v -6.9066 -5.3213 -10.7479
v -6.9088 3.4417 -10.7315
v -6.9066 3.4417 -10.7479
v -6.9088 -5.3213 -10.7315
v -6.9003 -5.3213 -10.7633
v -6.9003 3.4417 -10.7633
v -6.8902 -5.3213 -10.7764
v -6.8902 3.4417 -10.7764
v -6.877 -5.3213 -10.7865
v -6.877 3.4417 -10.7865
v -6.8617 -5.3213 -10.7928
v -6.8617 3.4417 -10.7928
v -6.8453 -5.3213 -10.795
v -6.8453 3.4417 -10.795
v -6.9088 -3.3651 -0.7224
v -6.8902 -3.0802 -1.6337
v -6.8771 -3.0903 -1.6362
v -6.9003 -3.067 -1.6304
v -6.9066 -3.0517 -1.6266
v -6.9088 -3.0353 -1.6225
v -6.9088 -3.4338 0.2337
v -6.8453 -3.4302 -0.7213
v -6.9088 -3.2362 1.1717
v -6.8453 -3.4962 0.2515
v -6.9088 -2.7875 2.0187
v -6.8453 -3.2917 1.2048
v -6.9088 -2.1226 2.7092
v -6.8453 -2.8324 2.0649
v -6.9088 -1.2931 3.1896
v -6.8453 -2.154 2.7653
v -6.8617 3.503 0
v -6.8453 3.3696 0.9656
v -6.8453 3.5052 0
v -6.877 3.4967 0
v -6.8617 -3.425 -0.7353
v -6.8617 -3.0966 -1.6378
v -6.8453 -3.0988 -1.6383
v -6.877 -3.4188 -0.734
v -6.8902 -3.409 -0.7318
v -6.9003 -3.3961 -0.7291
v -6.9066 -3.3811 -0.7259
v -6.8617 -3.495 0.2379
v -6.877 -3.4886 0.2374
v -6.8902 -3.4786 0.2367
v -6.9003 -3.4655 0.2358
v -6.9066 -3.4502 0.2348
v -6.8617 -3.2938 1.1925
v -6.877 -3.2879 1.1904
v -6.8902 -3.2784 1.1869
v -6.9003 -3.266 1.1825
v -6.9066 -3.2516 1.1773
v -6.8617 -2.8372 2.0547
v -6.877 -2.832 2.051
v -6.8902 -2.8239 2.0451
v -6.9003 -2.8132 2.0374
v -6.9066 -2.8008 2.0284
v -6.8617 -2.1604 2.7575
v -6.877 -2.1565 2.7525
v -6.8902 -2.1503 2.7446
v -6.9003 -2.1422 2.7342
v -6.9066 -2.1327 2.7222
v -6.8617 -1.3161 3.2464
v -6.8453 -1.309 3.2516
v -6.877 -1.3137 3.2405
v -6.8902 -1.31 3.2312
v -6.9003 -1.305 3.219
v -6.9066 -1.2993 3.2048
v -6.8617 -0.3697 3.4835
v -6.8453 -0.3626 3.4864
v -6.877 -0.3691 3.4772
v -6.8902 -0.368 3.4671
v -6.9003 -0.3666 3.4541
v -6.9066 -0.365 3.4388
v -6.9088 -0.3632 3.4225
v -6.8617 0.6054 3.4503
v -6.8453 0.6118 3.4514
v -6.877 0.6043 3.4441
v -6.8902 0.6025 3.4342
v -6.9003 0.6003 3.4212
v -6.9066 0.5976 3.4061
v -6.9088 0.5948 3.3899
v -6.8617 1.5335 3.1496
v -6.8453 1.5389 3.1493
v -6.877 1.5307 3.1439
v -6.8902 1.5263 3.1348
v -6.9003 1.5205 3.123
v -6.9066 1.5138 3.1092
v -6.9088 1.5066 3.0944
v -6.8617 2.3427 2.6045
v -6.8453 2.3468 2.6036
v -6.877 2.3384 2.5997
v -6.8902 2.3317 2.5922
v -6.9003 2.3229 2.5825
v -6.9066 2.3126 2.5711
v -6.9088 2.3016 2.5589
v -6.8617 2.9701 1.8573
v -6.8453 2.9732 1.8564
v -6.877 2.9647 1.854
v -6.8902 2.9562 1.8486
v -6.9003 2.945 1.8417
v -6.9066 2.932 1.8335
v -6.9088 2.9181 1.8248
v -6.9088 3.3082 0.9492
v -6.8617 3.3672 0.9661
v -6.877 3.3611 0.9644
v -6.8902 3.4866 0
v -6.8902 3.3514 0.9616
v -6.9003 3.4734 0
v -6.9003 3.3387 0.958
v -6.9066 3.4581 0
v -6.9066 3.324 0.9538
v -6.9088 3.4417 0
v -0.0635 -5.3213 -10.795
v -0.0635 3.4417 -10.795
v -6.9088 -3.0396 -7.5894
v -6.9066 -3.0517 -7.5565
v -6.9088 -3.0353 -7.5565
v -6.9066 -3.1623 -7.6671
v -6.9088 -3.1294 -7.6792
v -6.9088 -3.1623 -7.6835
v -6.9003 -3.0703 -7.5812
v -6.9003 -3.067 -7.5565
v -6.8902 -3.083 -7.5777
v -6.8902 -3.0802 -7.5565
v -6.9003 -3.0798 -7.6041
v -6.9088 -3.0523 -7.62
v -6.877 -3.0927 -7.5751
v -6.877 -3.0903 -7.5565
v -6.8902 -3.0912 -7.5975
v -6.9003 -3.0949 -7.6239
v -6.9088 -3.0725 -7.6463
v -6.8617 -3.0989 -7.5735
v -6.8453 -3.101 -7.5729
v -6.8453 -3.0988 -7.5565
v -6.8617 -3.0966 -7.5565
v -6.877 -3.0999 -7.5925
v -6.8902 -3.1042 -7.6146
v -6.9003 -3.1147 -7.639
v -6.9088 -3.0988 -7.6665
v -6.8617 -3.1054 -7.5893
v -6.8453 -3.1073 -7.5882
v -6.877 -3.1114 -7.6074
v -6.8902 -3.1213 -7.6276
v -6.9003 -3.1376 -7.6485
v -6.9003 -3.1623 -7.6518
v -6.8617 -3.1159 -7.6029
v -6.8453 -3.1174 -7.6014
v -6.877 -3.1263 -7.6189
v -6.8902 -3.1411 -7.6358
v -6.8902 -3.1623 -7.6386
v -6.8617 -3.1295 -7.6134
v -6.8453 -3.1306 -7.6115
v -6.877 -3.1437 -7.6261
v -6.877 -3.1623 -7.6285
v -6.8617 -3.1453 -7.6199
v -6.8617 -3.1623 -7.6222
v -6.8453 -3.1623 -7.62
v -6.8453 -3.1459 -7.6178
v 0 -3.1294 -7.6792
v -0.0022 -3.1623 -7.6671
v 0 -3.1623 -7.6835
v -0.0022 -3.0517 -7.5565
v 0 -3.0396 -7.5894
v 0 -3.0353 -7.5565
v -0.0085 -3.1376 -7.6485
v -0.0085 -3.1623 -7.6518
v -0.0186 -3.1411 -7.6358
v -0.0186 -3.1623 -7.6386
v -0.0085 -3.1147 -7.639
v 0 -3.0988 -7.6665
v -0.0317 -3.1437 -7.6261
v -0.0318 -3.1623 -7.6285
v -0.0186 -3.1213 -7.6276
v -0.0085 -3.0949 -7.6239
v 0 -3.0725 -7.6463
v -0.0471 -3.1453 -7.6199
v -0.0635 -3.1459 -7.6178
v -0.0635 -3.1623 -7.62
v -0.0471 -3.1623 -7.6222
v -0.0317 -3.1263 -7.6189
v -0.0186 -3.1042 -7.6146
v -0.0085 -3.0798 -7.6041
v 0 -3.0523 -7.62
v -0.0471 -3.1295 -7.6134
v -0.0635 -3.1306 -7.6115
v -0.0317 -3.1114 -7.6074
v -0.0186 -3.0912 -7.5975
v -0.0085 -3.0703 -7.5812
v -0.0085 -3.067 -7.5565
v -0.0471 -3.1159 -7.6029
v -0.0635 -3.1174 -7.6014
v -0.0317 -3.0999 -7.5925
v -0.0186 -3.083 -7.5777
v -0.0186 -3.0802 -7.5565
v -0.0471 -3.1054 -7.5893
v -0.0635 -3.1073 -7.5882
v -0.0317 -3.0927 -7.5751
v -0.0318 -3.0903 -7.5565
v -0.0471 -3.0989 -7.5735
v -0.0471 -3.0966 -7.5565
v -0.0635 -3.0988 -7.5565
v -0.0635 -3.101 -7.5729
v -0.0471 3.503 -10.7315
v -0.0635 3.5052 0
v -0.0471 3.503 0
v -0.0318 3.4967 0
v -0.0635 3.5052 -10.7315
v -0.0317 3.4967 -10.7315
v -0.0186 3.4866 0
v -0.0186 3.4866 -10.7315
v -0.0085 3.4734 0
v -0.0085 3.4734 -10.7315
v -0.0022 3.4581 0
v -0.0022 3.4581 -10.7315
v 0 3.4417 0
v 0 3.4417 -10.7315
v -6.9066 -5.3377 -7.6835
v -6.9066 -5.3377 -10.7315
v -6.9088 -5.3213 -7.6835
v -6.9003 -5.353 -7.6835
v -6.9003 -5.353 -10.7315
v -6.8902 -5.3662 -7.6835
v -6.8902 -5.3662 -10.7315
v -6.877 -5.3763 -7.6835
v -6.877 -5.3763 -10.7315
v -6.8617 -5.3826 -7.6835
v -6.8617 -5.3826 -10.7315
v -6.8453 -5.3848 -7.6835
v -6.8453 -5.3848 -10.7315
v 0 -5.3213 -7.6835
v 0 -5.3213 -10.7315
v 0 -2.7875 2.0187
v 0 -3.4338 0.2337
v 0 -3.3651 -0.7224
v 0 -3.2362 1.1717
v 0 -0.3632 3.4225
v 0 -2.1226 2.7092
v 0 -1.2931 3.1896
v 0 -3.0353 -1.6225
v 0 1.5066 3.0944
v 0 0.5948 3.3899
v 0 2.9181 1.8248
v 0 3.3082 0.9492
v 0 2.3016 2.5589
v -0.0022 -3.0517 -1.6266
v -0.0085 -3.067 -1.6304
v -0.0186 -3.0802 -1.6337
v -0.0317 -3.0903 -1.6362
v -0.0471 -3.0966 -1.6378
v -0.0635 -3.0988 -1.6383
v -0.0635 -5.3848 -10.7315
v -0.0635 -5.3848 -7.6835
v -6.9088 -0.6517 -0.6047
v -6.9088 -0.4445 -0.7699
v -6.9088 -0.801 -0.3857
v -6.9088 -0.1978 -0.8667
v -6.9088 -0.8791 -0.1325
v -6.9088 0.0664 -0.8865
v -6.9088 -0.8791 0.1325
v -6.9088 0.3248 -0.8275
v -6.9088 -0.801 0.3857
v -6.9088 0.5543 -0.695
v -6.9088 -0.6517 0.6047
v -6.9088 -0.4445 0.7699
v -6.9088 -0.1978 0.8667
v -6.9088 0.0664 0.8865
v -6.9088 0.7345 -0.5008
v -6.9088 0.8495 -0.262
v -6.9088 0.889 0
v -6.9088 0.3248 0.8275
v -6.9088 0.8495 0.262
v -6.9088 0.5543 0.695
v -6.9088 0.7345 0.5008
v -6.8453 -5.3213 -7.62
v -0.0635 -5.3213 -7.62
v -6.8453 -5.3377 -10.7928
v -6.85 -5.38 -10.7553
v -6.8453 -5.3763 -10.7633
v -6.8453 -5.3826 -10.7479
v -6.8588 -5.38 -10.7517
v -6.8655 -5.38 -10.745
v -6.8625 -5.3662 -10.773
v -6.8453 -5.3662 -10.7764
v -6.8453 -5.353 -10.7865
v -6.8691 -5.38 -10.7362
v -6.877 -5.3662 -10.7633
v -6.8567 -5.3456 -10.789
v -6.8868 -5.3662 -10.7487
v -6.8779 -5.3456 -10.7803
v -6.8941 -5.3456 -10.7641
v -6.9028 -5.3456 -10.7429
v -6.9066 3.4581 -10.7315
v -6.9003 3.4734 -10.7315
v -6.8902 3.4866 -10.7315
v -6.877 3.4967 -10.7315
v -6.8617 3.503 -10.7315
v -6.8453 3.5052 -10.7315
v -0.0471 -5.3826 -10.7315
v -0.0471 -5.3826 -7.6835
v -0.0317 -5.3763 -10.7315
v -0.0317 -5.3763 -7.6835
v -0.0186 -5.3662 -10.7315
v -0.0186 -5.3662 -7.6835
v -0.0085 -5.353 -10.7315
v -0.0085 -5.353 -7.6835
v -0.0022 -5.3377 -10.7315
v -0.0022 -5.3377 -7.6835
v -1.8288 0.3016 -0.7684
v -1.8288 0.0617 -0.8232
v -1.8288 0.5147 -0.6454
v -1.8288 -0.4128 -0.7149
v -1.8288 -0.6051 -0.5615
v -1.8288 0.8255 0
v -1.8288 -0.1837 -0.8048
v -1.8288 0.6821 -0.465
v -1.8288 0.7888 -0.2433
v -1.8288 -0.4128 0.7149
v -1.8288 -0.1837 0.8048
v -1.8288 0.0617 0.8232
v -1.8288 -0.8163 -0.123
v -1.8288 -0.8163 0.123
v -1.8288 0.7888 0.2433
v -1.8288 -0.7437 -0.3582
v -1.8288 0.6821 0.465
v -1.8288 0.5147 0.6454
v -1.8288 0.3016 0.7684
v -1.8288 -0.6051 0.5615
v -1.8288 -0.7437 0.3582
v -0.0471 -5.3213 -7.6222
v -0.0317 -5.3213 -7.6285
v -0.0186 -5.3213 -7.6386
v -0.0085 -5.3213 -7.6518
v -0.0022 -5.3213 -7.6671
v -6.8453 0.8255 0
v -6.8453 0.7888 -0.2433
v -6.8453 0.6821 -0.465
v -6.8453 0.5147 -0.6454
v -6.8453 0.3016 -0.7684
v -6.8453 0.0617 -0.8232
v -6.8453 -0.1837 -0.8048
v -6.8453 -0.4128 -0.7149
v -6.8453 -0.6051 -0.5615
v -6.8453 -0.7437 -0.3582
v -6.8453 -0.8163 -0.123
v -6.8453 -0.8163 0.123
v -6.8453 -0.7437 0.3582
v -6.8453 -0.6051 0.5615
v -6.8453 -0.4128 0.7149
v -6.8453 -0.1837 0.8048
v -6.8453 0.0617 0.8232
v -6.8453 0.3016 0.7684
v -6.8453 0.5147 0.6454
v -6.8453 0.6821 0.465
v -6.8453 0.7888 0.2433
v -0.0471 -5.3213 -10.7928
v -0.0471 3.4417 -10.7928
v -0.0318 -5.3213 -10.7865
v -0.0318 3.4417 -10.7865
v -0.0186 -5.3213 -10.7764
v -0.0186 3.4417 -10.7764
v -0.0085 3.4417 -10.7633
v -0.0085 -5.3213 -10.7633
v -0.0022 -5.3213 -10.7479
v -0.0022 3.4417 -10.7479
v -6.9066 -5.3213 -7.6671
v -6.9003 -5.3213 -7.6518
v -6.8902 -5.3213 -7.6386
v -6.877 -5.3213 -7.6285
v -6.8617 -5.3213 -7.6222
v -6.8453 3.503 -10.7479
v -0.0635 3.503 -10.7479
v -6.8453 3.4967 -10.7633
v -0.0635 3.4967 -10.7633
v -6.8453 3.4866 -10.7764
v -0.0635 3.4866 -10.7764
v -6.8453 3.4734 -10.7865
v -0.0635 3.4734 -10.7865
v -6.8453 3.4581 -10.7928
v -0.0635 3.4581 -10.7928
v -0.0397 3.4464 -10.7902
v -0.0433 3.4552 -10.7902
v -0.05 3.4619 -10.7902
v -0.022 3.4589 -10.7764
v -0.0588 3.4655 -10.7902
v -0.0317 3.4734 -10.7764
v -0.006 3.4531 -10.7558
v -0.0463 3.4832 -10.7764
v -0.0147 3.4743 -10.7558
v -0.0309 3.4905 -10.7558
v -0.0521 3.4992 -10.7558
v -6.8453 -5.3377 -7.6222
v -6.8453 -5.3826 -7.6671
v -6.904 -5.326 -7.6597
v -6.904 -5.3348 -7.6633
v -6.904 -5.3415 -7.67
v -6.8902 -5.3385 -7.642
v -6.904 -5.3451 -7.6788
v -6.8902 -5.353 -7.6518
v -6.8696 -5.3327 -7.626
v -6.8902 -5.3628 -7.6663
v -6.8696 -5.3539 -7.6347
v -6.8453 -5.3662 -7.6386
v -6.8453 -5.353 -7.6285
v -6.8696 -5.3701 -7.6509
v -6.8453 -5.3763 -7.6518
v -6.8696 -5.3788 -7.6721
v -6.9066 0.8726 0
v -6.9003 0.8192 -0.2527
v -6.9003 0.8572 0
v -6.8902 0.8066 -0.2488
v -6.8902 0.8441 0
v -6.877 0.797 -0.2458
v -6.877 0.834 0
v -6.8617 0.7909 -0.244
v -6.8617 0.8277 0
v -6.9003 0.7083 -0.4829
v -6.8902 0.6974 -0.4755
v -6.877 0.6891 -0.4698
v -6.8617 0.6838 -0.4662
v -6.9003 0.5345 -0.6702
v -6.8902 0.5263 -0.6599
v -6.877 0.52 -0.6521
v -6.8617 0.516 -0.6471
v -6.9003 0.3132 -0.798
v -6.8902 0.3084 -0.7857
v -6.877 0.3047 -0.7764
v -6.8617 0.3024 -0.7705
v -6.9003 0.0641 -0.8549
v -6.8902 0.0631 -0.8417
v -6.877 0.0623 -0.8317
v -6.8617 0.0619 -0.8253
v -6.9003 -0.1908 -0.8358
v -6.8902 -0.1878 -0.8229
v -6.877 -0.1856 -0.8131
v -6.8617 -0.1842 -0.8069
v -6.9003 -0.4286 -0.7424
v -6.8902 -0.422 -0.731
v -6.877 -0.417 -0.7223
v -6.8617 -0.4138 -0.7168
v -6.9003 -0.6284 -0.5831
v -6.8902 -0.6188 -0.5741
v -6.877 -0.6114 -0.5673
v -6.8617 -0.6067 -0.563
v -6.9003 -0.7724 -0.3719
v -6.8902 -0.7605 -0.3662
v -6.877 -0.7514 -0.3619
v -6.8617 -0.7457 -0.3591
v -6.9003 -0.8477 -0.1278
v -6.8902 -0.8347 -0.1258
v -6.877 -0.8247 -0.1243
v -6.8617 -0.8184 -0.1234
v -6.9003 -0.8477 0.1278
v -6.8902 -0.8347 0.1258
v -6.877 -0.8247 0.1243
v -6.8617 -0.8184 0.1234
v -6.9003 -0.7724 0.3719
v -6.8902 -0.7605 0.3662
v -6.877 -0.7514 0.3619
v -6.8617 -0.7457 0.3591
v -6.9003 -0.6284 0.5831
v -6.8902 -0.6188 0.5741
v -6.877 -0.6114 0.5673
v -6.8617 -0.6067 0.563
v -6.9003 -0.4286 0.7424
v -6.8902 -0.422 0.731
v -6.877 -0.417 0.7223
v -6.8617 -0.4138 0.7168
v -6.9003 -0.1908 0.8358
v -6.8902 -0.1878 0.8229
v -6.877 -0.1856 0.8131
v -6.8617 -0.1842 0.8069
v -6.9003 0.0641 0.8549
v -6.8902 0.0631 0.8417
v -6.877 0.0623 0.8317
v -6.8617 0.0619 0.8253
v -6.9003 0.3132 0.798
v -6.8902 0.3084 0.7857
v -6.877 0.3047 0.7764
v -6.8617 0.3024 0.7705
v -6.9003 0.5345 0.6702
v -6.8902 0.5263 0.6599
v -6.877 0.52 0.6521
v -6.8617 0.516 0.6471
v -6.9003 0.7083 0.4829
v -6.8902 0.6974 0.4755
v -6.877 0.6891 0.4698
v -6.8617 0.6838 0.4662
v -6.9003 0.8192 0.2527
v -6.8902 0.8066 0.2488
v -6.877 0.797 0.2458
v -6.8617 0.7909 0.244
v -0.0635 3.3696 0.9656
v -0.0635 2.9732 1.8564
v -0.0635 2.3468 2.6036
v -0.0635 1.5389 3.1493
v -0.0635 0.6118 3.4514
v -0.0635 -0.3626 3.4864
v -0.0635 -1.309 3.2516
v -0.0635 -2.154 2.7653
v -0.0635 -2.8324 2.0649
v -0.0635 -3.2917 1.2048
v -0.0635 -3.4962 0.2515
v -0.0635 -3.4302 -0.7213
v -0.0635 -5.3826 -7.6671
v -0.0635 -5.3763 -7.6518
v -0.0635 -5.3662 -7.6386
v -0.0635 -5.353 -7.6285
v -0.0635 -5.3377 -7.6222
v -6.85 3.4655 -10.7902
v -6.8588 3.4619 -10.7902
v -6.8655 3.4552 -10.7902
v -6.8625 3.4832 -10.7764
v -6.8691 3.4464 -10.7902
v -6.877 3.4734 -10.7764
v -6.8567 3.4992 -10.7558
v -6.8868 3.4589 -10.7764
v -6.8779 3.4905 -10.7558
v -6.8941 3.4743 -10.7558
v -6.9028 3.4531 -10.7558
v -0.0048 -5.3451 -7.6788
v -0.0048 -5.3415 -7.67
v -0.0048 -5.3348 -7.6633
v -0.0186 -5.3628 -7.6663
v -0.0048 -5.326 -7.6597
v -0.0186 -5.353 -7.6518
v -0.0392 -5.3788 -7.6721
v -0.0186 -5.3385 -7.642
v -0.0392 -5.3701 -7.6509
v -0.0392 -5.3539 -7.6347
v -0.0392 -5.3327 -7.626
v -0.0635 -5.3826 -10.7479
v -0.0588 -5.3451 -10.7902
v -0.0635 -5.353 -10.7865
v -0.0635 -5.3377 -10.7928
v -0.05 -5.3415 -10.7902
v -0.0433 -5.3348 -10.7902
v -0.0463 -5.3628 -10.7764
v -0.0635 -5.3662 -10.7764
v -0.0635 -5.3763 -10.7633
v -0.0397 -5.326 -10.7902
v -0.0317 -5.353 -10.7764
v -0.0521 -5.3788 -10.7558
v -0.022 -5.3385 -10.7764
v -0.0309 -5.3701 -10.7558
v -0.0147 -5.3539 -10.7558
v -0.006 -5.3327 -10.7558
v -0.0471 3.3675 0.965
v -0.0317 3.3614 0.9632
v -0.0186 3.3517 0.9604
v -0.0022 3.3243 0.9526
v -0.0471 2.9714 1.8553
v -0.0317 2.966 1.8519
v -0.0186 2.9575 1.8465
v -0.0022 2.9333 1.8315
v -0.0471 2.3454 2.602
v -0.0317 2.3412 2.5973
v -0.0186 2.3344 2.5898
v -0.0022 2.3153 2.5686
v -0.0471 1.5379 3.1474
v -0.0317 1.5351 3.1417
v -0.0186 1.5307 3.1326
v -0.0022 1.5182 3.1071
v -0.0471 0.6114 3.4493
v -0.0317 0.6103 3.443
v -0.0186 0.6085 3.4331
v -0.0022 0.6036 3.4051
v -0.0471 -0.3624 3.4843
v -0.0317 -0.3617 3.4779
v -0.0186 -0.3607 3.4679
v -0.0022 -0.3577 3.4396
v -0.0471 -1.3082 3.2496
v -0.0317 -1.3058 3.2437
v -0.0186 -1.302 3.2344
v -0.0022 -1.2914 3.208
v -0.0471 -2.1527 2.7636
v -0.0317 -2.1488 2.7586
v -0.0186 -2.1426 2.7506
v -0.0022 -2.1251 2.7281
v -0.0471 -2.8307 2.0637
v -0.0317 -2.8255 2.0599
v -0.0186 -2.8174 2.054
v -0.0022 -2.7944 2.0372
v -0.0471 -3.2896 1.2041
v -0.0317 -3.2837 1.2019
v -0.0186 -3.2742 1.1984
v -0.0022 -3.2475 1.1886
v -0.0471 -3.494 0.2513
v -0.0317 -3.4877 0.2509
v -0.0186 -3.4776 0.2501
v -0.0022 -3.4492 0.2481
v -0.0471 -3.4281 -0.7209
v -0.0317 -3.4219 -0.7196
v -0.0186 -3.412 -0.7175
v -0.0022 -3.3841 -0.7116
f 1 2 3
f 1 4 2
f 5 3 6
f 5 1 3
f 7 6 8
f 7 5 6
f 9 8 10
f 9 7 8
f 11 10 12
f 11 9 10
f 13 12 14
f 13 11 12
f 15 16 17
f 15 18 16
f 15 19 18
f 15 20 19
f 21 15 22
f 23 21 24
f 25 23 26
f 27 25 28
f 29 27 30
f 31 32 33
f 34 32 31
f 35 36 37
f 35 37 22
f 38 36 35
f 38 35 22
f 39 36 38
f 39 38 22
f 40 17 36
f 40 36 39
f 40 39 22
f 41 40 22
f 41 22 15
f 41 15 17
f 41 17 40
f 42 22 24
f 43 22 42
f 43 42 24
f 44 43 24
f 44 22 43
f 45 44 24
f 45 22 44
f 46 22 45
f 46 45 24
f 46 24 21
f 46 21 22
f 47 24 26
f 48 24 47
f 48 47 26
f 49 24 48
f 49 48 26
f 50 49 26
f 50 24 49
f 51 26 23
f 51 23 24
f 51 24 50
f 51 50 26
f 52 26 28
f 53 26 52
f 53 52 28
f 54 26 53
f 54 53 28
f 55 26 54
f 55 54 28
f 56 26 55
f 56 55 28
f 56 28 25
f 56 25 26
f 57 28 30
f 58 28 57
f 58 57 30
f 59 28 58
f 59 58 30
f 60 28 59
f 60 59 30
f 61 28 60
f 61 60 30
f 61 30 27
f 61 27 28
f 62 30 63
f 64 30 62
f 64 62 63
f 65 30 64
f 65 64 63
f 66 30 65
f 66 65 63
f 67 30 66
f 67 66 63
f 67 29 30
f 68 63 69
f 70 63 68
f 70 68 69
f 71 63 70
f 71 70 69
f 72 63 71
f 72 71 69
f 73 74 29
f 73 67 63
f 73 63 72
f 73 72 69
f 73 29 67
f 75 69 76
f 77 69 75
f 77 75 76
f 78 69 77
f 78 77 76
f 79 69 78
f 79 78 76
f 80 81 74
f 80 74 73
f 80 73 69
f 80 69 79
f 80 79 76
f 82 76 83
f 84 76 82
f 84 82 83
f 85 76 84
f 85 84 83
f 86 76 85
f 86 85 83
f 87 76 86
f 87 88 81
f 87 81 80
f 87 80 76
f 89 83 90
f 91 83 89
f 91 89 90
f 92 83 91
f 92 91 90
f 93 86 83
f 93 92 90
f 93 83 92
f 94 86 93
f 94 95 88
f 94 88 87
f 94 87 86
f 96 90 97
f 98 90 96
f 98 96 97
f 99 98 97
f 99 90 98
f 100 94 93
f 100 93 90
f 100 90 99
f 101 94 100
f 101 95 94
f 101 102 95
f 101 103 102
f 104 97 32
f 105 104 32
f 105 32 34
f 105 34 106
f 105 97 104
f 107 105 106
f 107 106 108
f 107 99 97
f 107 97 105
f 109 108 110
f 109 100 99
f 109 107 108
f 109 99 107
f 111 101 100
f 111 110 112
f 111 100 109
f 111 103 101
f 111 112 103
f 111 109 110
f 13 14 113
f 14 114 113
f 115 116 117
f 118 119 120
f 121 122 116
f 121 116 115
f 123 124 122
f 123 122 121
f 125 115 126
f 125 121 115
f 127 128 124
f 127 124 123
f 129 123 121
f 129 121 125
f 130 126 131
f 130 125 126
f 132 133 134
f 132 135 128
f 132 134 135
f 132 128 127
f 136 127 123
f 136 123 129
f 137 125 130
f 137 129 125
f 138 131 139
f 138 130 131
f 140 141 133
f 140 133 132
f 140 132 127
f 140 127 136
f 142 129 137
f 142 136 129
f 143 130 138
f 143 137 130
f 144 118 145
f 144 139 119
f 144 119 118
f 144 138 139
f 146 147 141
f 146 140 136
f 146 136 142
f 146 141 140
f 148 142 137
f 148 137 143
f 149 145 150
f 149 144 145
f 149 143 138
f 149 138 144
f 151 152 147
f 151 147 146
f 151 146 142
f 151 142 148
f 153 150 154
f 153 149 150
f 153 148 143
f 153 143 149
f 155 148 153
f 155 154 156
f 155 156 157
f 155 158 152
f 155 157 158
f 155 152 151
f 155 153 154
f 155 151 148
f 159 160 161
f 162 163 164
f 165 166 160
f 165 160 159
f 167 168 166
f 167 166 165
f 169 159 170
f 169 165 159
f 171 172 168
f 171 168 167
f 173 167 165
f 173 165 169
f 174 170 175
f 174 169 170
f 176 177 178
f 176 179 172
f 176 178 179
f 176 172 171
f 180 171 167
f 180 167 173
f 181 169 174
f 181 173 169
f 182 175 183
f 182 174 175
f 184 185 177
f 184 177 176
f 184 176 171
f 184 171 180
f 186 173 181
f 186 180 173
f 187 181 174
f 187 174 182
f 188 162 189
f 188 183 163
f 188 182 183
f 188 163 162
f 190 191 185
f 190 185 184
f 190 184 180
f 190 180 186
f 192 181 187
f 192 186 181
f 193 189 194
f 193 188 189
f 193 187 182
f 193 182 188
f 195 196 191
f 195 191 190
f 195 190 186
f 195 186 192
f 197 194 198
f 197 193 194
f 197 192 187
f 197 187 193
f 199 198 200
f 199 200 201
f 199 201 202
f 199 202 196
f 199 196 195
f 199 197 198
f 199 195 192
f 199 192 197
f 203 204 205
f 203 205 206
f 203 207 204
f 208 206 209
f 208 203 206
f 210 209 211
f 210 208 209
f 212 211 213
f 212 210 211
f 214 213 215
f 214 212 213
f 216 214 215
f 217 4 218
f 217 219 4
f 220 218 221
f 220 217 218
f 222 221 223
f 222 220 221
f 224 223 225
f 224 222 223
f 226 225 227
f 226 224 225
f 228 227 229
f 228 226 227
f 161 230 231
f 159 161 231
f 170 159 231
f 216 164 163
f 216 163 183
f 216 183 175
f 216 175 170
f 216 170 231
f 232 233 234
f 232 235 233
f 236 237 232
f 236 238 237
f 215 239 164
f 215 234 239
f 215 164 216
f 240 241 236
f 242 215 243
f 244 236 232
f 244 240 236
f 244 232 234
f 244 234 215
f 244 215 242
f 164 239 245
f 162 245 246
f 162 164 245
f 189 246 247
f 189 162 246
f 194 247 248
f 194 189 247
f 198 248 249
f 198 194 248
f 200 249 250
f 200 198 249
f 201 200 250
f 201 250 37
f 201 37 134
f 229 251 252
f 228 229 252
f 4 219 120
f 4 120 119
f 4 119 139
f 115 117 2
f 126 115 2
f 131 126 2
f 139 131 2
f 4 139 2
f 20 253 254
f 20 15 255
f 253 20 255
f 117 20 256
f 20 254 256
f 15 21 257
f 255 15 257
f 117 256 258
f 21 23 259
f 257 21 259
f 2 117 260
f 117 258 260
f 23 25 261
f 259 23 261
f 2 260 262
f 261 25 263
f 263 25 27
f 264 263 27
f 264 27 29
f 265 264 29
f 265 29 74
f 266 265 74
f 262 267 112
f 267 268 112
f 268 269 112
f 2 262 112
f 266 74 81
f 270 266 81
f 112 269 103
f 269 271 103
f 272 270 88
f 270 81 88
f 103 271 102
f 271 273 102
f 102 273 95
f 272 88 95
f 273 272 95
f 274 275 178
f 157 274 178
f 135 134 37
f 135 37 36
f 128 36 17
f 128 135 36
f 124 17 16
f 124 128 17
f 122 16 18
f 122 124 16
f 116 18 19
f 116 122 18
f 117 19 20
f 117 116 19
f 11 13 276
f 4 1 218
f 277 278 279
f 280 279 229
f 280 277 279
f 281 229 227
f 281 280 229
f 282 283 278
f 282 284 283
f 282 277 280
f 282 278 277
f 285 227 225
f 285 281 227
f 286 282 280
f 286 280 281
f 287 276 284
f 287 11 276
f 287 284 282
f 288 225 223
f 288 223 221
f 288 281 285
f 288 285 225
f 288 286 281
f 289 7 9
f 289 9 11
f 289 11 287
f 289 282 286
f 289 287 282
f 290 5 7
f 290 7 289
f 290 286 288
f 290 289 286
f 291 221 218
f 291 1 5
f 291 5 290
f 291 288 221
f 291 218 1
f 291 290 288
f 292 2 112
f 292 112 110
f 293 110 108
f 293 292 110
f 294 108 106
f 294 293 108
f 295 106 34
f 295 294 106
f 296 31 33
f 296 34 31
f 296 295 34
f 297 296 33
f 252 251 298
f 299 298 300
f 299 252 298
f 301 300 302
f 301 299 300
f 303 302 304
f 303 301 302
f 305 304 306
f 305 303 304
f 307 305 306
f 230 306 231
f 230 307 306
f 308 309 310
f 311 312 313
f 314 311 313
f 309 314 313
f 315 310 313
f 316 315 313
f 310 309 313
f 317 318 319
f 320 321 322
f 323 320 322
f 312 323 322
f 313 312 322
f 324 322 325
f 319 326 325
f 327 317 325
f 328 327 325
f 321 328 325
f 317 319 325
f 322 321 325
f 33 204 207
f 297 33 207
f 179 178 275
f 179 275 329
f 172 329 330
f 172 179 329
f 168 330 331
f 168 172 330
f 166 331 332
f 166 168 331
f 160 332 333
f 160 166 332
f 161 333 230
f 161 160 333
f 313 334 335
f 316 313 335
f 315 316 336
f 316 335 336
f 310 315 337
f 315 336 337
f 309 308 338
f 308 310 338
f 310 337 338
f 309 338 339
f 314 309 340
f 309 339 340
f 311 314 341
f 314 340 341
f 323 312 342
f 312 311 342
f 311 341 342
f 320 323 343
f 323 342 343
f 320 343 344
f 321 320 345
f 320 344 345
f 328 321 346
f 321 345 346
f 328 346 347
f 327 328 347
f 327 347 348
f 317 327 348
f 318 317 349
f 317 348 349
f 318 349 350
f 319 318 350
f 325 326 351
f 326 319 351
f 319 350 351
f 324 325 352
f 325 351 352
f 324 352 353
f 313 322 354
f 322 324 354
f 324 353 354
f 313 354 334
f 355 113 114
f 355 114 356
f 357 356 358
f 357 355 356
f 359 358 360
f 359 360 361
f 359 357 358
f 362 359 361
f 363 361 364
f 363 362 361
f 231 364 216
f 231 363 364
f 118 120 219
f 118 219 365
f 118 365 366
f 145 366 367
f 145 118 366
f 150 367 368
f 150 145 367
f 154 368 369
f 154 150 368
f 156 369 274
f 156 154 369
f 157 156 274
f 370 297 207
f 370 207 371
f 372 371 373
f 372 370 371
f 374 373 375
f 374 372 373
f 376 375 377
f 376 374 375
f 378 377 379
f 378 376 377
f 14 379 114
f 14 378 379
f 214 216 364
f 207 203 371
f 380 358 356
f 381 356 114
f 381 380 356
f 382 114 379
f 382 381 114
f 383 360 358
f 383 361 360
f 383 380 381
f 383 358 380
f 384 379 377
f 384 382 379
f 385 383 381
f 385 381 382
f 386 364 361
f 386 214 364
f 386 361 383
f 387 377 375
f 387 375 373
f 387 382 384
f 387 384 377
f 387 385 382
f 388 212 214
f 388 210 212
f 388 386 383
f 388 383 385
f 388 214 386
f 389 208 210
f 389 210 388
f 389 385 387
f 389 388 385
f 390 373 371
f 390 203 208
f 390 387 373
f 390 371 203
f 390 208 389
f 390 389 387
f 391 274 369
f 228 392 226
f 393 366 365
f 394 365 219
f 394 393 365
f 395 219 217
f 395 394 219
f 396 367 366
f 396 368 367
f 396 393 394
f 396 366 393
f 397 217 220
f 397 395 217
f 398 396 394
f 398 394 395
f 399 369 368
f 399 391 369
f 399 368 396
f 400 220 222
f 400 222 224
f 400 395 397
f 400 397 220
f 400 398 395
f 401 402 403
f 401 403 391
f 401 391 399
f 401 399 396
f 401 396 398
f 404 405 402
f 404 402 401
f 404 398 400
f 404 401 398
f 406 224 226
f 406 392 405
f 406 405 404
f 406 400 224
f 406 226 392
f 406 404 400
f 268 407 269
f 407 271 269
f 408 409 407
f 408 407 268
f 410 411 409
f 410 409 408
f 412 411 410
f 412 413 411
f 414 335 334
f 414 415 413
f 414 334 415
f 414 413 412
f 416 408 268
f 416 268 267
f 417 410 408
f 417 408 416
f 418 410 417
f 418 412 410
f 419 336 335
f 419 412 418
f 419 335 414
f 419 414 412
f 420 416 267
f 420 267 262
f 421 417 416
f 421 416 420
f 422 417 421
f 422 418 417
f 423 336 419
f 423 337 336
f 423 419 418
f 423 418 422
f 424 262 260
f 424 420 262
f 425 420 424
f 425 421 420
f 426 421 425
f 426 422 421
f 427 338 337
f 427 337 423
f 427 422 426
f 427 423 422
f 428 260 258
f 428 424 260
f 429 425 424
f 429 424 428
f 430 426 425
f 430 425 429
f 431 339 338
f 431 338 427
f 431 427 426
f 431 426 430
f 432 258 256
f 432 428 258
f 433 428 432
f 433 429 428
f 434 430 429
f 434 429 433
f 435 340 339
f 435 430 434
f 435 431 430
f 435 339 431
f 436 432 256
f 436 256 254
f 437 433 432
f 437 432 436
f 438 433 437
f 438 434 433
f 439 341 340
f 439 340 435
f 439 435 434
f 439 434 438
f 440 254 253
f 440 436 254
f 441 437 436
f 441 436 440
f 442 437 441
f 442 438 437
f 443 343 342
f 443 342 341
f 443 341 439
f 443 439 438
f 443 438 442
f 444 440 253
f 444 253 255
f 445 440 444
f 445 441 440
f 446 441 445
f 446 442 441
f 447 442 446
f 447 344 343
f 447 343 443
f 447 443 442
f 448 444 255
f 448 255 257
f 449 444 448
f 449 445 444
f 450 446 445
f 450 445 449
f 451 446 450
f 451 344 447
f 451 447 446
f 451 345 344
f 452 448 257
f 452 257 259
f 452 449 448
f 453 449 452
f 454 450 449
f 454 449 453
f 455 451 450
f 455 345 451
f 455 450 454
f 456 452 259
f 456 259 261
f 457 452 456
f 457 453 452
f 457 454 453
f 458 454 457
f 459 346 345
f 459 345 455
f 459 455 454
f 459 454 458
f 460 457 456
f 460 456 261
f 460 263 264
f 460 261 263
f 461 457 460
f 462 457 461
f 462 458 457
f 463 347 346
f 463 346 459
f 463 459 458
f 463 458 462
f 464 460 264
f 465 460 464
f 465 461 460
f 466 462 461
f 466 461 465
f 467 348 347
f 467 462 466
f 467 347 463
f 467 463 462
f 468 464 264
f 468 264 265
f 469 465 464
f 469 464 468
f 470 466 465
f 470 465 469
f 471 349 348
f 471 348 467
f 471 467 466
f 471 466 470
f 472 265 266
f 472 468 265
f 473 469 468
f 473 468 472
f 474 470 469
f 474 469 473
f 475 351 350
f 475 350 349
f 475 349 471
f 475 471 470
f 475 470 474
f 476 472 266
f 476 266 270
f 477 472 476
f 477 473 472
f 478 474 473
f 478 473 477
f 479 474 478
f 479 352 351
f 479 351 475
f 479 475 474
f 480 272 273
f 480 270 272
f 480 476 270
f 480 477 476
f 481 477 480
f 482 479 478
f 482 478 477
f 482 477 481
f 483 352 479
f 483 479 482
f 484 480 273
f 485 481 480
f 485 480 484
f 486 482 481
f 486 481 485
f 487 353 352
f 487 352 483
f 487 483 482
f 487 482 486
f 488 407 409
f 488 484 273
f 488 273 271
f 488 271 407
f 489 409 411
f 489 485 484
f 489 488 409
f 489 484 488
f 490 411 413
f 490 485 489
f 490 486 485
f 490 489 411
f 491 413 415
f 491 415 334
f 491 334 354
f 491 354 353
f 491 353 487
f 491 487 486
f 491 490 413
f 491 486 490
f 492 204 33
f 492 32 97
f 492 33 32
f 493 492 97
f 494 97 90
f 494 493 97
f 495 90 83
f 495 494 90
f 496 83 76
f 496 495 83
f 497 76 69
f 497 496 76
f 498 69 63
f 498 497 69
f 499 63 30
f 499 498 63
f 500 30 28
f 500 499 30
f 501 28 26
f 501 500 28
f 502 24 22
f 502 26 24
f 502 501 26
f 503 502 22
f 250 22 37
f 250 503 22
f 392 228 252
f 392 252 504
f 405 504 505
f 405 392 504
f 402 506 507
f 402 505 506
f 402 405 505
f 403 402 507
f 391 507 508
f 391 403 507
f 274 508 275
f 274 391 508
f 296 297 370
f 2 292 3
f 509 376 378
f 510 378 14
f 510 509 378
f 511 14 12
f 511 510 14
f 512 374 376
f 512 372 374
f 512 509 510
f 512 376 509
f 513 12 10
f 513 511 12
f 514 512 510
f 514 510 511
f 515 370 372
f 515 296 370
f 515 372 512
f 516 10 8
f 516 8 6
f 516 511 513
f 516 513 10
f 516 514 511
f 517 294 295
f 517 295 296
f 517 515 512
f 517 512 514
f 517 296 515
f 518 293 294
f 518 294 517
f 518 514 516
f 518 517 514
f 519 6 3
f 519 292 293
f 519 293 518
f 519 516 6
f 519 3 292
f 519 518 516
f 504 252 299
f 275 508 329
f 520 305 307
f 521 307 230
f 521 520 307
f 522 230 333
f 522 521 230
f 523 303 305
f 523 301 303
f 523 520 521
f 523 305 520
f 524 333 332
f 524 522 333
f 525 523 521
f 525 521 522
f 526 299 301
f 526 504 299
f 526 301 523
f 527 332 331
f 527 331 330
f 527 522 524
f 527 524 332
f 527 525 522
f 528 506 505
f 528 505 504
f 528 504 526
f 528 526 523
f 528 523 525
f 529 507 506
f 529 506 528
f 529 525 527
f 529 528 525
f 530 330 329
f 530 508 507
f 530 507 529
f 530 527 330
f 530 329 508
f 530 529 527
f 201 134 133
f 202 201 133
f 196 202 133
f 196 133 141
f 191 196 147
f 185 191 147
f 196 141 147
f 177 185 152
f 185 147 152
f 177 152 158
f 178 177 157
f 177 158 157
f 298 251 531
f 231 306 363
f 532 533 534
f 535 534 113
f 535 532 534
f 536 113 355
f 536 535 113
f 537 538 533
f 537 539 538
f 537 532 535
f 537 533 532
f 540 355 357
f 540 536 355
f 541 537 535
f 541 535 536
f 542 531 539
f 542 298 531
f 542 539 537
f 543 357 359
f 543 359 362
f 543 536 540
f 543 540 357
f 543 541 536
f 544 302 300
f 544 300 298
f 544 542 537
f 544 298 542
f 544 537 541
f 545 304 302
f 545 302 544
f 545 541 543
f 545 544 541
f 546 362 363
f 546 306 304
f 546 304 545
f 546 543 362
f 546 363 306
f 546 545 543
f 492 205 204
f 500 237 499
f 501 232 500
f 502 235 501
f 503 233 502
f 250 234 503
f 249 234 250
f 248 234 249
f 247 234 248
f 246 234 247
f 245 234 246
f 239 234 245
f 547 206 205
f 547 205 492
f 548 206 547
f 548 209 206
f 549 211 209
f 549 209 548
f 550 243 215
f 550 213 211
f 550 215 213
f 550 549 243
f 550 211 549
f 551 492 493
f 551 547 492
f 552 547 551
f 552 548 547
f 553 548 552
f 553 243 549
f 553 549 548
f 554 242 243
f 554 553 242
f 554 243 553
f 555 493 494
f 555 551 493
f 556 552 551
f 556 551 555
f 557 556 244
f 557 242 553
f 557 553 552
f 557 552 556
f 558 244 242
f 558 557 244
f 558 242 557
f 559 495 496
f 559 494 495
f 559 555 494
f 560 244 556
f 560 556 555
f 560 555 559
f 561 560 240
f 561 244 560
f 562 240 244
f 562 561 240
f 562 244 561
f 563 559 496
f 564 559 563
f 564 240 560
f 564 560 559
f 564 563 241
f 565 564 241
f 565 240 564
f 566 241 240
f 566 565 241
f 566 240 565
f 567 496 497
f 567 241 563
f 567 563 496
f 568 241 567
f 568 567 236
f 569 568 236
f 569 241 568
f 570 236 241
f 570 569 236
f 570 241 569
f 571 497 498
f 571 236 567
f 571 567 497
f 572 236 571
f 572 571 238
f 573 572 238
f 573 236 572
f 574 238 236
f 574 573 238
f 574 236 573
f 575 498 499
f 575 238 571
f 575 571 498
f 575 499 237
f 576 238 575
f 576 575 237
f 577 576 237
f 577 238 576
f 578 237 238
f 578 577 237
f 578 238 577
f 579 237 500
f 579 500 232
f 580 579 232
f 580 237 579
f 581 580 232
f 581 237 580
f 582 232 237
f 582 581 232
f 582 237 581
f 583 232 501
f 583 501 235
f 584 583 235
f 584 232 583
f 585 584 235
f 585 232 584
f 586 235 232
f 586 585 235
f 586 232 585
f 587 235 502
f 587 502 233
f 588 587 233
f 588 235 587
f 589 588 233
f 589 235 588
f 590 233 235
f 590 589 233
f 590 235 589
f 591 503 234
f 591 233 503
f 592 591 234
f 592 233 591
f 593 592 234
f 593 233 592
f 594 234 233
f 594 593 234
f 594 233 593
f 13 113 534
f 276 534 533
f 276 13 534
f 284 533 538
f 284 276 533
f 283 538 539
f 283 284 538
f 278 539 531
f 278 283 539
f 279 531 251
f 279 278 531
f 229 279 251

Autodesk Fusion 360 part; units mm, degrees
sketch "LegOutline" plane through (0, 0, 0) normal (1, 0, 0) x (0, 1, 0)
  line L0 (3.5052, 0) -> (3.5052, -10.795)
  line L1 (3.5052, -10.795) -> (-5.3848, -10.795)
  line L2 (-5.3848, -10.795) -> (-5.3848, -7.62)
  line L3 (-3.0988, -1.6383) -> (-3.0988, -7.62)
  line L4 (-5.3848, -7.62) -> (-3.0988, -7.62)
  arc A0 (3.5052, 0) -> (-3.0988, -1.6383) centre (0, 0) ccw
  circle A1 centre (0, 0) radius 0.8255
  dimension "d1" = 7.0104
  dimension "d2" = 10.795
  dimension "d3" = 8.89
  dimension "d4" = 3.175
  dimension "d5" = 6.604
  dimension "d6" = 1.651
extrude "Extrude1" add sketch "LegOutline" against normal blind 6.9088 contours L0 L1 L2 L3 L4 A0 | A1
extrude "Extrude2" cut sketch "LegOutline" along normal blind 5.08 from surface at -6.9088 contours A1
fillet "Fillet1" radius 0.0635 2 edges at (-3.4544, -3.0988, -7.62) (-3.4544, -5.3848, -7.62) 3 faces at (-6.9088, 0.236, -6.3945) (0, 1.3039, -6.1383) (-4.6059, 0.5419, -10.795)
